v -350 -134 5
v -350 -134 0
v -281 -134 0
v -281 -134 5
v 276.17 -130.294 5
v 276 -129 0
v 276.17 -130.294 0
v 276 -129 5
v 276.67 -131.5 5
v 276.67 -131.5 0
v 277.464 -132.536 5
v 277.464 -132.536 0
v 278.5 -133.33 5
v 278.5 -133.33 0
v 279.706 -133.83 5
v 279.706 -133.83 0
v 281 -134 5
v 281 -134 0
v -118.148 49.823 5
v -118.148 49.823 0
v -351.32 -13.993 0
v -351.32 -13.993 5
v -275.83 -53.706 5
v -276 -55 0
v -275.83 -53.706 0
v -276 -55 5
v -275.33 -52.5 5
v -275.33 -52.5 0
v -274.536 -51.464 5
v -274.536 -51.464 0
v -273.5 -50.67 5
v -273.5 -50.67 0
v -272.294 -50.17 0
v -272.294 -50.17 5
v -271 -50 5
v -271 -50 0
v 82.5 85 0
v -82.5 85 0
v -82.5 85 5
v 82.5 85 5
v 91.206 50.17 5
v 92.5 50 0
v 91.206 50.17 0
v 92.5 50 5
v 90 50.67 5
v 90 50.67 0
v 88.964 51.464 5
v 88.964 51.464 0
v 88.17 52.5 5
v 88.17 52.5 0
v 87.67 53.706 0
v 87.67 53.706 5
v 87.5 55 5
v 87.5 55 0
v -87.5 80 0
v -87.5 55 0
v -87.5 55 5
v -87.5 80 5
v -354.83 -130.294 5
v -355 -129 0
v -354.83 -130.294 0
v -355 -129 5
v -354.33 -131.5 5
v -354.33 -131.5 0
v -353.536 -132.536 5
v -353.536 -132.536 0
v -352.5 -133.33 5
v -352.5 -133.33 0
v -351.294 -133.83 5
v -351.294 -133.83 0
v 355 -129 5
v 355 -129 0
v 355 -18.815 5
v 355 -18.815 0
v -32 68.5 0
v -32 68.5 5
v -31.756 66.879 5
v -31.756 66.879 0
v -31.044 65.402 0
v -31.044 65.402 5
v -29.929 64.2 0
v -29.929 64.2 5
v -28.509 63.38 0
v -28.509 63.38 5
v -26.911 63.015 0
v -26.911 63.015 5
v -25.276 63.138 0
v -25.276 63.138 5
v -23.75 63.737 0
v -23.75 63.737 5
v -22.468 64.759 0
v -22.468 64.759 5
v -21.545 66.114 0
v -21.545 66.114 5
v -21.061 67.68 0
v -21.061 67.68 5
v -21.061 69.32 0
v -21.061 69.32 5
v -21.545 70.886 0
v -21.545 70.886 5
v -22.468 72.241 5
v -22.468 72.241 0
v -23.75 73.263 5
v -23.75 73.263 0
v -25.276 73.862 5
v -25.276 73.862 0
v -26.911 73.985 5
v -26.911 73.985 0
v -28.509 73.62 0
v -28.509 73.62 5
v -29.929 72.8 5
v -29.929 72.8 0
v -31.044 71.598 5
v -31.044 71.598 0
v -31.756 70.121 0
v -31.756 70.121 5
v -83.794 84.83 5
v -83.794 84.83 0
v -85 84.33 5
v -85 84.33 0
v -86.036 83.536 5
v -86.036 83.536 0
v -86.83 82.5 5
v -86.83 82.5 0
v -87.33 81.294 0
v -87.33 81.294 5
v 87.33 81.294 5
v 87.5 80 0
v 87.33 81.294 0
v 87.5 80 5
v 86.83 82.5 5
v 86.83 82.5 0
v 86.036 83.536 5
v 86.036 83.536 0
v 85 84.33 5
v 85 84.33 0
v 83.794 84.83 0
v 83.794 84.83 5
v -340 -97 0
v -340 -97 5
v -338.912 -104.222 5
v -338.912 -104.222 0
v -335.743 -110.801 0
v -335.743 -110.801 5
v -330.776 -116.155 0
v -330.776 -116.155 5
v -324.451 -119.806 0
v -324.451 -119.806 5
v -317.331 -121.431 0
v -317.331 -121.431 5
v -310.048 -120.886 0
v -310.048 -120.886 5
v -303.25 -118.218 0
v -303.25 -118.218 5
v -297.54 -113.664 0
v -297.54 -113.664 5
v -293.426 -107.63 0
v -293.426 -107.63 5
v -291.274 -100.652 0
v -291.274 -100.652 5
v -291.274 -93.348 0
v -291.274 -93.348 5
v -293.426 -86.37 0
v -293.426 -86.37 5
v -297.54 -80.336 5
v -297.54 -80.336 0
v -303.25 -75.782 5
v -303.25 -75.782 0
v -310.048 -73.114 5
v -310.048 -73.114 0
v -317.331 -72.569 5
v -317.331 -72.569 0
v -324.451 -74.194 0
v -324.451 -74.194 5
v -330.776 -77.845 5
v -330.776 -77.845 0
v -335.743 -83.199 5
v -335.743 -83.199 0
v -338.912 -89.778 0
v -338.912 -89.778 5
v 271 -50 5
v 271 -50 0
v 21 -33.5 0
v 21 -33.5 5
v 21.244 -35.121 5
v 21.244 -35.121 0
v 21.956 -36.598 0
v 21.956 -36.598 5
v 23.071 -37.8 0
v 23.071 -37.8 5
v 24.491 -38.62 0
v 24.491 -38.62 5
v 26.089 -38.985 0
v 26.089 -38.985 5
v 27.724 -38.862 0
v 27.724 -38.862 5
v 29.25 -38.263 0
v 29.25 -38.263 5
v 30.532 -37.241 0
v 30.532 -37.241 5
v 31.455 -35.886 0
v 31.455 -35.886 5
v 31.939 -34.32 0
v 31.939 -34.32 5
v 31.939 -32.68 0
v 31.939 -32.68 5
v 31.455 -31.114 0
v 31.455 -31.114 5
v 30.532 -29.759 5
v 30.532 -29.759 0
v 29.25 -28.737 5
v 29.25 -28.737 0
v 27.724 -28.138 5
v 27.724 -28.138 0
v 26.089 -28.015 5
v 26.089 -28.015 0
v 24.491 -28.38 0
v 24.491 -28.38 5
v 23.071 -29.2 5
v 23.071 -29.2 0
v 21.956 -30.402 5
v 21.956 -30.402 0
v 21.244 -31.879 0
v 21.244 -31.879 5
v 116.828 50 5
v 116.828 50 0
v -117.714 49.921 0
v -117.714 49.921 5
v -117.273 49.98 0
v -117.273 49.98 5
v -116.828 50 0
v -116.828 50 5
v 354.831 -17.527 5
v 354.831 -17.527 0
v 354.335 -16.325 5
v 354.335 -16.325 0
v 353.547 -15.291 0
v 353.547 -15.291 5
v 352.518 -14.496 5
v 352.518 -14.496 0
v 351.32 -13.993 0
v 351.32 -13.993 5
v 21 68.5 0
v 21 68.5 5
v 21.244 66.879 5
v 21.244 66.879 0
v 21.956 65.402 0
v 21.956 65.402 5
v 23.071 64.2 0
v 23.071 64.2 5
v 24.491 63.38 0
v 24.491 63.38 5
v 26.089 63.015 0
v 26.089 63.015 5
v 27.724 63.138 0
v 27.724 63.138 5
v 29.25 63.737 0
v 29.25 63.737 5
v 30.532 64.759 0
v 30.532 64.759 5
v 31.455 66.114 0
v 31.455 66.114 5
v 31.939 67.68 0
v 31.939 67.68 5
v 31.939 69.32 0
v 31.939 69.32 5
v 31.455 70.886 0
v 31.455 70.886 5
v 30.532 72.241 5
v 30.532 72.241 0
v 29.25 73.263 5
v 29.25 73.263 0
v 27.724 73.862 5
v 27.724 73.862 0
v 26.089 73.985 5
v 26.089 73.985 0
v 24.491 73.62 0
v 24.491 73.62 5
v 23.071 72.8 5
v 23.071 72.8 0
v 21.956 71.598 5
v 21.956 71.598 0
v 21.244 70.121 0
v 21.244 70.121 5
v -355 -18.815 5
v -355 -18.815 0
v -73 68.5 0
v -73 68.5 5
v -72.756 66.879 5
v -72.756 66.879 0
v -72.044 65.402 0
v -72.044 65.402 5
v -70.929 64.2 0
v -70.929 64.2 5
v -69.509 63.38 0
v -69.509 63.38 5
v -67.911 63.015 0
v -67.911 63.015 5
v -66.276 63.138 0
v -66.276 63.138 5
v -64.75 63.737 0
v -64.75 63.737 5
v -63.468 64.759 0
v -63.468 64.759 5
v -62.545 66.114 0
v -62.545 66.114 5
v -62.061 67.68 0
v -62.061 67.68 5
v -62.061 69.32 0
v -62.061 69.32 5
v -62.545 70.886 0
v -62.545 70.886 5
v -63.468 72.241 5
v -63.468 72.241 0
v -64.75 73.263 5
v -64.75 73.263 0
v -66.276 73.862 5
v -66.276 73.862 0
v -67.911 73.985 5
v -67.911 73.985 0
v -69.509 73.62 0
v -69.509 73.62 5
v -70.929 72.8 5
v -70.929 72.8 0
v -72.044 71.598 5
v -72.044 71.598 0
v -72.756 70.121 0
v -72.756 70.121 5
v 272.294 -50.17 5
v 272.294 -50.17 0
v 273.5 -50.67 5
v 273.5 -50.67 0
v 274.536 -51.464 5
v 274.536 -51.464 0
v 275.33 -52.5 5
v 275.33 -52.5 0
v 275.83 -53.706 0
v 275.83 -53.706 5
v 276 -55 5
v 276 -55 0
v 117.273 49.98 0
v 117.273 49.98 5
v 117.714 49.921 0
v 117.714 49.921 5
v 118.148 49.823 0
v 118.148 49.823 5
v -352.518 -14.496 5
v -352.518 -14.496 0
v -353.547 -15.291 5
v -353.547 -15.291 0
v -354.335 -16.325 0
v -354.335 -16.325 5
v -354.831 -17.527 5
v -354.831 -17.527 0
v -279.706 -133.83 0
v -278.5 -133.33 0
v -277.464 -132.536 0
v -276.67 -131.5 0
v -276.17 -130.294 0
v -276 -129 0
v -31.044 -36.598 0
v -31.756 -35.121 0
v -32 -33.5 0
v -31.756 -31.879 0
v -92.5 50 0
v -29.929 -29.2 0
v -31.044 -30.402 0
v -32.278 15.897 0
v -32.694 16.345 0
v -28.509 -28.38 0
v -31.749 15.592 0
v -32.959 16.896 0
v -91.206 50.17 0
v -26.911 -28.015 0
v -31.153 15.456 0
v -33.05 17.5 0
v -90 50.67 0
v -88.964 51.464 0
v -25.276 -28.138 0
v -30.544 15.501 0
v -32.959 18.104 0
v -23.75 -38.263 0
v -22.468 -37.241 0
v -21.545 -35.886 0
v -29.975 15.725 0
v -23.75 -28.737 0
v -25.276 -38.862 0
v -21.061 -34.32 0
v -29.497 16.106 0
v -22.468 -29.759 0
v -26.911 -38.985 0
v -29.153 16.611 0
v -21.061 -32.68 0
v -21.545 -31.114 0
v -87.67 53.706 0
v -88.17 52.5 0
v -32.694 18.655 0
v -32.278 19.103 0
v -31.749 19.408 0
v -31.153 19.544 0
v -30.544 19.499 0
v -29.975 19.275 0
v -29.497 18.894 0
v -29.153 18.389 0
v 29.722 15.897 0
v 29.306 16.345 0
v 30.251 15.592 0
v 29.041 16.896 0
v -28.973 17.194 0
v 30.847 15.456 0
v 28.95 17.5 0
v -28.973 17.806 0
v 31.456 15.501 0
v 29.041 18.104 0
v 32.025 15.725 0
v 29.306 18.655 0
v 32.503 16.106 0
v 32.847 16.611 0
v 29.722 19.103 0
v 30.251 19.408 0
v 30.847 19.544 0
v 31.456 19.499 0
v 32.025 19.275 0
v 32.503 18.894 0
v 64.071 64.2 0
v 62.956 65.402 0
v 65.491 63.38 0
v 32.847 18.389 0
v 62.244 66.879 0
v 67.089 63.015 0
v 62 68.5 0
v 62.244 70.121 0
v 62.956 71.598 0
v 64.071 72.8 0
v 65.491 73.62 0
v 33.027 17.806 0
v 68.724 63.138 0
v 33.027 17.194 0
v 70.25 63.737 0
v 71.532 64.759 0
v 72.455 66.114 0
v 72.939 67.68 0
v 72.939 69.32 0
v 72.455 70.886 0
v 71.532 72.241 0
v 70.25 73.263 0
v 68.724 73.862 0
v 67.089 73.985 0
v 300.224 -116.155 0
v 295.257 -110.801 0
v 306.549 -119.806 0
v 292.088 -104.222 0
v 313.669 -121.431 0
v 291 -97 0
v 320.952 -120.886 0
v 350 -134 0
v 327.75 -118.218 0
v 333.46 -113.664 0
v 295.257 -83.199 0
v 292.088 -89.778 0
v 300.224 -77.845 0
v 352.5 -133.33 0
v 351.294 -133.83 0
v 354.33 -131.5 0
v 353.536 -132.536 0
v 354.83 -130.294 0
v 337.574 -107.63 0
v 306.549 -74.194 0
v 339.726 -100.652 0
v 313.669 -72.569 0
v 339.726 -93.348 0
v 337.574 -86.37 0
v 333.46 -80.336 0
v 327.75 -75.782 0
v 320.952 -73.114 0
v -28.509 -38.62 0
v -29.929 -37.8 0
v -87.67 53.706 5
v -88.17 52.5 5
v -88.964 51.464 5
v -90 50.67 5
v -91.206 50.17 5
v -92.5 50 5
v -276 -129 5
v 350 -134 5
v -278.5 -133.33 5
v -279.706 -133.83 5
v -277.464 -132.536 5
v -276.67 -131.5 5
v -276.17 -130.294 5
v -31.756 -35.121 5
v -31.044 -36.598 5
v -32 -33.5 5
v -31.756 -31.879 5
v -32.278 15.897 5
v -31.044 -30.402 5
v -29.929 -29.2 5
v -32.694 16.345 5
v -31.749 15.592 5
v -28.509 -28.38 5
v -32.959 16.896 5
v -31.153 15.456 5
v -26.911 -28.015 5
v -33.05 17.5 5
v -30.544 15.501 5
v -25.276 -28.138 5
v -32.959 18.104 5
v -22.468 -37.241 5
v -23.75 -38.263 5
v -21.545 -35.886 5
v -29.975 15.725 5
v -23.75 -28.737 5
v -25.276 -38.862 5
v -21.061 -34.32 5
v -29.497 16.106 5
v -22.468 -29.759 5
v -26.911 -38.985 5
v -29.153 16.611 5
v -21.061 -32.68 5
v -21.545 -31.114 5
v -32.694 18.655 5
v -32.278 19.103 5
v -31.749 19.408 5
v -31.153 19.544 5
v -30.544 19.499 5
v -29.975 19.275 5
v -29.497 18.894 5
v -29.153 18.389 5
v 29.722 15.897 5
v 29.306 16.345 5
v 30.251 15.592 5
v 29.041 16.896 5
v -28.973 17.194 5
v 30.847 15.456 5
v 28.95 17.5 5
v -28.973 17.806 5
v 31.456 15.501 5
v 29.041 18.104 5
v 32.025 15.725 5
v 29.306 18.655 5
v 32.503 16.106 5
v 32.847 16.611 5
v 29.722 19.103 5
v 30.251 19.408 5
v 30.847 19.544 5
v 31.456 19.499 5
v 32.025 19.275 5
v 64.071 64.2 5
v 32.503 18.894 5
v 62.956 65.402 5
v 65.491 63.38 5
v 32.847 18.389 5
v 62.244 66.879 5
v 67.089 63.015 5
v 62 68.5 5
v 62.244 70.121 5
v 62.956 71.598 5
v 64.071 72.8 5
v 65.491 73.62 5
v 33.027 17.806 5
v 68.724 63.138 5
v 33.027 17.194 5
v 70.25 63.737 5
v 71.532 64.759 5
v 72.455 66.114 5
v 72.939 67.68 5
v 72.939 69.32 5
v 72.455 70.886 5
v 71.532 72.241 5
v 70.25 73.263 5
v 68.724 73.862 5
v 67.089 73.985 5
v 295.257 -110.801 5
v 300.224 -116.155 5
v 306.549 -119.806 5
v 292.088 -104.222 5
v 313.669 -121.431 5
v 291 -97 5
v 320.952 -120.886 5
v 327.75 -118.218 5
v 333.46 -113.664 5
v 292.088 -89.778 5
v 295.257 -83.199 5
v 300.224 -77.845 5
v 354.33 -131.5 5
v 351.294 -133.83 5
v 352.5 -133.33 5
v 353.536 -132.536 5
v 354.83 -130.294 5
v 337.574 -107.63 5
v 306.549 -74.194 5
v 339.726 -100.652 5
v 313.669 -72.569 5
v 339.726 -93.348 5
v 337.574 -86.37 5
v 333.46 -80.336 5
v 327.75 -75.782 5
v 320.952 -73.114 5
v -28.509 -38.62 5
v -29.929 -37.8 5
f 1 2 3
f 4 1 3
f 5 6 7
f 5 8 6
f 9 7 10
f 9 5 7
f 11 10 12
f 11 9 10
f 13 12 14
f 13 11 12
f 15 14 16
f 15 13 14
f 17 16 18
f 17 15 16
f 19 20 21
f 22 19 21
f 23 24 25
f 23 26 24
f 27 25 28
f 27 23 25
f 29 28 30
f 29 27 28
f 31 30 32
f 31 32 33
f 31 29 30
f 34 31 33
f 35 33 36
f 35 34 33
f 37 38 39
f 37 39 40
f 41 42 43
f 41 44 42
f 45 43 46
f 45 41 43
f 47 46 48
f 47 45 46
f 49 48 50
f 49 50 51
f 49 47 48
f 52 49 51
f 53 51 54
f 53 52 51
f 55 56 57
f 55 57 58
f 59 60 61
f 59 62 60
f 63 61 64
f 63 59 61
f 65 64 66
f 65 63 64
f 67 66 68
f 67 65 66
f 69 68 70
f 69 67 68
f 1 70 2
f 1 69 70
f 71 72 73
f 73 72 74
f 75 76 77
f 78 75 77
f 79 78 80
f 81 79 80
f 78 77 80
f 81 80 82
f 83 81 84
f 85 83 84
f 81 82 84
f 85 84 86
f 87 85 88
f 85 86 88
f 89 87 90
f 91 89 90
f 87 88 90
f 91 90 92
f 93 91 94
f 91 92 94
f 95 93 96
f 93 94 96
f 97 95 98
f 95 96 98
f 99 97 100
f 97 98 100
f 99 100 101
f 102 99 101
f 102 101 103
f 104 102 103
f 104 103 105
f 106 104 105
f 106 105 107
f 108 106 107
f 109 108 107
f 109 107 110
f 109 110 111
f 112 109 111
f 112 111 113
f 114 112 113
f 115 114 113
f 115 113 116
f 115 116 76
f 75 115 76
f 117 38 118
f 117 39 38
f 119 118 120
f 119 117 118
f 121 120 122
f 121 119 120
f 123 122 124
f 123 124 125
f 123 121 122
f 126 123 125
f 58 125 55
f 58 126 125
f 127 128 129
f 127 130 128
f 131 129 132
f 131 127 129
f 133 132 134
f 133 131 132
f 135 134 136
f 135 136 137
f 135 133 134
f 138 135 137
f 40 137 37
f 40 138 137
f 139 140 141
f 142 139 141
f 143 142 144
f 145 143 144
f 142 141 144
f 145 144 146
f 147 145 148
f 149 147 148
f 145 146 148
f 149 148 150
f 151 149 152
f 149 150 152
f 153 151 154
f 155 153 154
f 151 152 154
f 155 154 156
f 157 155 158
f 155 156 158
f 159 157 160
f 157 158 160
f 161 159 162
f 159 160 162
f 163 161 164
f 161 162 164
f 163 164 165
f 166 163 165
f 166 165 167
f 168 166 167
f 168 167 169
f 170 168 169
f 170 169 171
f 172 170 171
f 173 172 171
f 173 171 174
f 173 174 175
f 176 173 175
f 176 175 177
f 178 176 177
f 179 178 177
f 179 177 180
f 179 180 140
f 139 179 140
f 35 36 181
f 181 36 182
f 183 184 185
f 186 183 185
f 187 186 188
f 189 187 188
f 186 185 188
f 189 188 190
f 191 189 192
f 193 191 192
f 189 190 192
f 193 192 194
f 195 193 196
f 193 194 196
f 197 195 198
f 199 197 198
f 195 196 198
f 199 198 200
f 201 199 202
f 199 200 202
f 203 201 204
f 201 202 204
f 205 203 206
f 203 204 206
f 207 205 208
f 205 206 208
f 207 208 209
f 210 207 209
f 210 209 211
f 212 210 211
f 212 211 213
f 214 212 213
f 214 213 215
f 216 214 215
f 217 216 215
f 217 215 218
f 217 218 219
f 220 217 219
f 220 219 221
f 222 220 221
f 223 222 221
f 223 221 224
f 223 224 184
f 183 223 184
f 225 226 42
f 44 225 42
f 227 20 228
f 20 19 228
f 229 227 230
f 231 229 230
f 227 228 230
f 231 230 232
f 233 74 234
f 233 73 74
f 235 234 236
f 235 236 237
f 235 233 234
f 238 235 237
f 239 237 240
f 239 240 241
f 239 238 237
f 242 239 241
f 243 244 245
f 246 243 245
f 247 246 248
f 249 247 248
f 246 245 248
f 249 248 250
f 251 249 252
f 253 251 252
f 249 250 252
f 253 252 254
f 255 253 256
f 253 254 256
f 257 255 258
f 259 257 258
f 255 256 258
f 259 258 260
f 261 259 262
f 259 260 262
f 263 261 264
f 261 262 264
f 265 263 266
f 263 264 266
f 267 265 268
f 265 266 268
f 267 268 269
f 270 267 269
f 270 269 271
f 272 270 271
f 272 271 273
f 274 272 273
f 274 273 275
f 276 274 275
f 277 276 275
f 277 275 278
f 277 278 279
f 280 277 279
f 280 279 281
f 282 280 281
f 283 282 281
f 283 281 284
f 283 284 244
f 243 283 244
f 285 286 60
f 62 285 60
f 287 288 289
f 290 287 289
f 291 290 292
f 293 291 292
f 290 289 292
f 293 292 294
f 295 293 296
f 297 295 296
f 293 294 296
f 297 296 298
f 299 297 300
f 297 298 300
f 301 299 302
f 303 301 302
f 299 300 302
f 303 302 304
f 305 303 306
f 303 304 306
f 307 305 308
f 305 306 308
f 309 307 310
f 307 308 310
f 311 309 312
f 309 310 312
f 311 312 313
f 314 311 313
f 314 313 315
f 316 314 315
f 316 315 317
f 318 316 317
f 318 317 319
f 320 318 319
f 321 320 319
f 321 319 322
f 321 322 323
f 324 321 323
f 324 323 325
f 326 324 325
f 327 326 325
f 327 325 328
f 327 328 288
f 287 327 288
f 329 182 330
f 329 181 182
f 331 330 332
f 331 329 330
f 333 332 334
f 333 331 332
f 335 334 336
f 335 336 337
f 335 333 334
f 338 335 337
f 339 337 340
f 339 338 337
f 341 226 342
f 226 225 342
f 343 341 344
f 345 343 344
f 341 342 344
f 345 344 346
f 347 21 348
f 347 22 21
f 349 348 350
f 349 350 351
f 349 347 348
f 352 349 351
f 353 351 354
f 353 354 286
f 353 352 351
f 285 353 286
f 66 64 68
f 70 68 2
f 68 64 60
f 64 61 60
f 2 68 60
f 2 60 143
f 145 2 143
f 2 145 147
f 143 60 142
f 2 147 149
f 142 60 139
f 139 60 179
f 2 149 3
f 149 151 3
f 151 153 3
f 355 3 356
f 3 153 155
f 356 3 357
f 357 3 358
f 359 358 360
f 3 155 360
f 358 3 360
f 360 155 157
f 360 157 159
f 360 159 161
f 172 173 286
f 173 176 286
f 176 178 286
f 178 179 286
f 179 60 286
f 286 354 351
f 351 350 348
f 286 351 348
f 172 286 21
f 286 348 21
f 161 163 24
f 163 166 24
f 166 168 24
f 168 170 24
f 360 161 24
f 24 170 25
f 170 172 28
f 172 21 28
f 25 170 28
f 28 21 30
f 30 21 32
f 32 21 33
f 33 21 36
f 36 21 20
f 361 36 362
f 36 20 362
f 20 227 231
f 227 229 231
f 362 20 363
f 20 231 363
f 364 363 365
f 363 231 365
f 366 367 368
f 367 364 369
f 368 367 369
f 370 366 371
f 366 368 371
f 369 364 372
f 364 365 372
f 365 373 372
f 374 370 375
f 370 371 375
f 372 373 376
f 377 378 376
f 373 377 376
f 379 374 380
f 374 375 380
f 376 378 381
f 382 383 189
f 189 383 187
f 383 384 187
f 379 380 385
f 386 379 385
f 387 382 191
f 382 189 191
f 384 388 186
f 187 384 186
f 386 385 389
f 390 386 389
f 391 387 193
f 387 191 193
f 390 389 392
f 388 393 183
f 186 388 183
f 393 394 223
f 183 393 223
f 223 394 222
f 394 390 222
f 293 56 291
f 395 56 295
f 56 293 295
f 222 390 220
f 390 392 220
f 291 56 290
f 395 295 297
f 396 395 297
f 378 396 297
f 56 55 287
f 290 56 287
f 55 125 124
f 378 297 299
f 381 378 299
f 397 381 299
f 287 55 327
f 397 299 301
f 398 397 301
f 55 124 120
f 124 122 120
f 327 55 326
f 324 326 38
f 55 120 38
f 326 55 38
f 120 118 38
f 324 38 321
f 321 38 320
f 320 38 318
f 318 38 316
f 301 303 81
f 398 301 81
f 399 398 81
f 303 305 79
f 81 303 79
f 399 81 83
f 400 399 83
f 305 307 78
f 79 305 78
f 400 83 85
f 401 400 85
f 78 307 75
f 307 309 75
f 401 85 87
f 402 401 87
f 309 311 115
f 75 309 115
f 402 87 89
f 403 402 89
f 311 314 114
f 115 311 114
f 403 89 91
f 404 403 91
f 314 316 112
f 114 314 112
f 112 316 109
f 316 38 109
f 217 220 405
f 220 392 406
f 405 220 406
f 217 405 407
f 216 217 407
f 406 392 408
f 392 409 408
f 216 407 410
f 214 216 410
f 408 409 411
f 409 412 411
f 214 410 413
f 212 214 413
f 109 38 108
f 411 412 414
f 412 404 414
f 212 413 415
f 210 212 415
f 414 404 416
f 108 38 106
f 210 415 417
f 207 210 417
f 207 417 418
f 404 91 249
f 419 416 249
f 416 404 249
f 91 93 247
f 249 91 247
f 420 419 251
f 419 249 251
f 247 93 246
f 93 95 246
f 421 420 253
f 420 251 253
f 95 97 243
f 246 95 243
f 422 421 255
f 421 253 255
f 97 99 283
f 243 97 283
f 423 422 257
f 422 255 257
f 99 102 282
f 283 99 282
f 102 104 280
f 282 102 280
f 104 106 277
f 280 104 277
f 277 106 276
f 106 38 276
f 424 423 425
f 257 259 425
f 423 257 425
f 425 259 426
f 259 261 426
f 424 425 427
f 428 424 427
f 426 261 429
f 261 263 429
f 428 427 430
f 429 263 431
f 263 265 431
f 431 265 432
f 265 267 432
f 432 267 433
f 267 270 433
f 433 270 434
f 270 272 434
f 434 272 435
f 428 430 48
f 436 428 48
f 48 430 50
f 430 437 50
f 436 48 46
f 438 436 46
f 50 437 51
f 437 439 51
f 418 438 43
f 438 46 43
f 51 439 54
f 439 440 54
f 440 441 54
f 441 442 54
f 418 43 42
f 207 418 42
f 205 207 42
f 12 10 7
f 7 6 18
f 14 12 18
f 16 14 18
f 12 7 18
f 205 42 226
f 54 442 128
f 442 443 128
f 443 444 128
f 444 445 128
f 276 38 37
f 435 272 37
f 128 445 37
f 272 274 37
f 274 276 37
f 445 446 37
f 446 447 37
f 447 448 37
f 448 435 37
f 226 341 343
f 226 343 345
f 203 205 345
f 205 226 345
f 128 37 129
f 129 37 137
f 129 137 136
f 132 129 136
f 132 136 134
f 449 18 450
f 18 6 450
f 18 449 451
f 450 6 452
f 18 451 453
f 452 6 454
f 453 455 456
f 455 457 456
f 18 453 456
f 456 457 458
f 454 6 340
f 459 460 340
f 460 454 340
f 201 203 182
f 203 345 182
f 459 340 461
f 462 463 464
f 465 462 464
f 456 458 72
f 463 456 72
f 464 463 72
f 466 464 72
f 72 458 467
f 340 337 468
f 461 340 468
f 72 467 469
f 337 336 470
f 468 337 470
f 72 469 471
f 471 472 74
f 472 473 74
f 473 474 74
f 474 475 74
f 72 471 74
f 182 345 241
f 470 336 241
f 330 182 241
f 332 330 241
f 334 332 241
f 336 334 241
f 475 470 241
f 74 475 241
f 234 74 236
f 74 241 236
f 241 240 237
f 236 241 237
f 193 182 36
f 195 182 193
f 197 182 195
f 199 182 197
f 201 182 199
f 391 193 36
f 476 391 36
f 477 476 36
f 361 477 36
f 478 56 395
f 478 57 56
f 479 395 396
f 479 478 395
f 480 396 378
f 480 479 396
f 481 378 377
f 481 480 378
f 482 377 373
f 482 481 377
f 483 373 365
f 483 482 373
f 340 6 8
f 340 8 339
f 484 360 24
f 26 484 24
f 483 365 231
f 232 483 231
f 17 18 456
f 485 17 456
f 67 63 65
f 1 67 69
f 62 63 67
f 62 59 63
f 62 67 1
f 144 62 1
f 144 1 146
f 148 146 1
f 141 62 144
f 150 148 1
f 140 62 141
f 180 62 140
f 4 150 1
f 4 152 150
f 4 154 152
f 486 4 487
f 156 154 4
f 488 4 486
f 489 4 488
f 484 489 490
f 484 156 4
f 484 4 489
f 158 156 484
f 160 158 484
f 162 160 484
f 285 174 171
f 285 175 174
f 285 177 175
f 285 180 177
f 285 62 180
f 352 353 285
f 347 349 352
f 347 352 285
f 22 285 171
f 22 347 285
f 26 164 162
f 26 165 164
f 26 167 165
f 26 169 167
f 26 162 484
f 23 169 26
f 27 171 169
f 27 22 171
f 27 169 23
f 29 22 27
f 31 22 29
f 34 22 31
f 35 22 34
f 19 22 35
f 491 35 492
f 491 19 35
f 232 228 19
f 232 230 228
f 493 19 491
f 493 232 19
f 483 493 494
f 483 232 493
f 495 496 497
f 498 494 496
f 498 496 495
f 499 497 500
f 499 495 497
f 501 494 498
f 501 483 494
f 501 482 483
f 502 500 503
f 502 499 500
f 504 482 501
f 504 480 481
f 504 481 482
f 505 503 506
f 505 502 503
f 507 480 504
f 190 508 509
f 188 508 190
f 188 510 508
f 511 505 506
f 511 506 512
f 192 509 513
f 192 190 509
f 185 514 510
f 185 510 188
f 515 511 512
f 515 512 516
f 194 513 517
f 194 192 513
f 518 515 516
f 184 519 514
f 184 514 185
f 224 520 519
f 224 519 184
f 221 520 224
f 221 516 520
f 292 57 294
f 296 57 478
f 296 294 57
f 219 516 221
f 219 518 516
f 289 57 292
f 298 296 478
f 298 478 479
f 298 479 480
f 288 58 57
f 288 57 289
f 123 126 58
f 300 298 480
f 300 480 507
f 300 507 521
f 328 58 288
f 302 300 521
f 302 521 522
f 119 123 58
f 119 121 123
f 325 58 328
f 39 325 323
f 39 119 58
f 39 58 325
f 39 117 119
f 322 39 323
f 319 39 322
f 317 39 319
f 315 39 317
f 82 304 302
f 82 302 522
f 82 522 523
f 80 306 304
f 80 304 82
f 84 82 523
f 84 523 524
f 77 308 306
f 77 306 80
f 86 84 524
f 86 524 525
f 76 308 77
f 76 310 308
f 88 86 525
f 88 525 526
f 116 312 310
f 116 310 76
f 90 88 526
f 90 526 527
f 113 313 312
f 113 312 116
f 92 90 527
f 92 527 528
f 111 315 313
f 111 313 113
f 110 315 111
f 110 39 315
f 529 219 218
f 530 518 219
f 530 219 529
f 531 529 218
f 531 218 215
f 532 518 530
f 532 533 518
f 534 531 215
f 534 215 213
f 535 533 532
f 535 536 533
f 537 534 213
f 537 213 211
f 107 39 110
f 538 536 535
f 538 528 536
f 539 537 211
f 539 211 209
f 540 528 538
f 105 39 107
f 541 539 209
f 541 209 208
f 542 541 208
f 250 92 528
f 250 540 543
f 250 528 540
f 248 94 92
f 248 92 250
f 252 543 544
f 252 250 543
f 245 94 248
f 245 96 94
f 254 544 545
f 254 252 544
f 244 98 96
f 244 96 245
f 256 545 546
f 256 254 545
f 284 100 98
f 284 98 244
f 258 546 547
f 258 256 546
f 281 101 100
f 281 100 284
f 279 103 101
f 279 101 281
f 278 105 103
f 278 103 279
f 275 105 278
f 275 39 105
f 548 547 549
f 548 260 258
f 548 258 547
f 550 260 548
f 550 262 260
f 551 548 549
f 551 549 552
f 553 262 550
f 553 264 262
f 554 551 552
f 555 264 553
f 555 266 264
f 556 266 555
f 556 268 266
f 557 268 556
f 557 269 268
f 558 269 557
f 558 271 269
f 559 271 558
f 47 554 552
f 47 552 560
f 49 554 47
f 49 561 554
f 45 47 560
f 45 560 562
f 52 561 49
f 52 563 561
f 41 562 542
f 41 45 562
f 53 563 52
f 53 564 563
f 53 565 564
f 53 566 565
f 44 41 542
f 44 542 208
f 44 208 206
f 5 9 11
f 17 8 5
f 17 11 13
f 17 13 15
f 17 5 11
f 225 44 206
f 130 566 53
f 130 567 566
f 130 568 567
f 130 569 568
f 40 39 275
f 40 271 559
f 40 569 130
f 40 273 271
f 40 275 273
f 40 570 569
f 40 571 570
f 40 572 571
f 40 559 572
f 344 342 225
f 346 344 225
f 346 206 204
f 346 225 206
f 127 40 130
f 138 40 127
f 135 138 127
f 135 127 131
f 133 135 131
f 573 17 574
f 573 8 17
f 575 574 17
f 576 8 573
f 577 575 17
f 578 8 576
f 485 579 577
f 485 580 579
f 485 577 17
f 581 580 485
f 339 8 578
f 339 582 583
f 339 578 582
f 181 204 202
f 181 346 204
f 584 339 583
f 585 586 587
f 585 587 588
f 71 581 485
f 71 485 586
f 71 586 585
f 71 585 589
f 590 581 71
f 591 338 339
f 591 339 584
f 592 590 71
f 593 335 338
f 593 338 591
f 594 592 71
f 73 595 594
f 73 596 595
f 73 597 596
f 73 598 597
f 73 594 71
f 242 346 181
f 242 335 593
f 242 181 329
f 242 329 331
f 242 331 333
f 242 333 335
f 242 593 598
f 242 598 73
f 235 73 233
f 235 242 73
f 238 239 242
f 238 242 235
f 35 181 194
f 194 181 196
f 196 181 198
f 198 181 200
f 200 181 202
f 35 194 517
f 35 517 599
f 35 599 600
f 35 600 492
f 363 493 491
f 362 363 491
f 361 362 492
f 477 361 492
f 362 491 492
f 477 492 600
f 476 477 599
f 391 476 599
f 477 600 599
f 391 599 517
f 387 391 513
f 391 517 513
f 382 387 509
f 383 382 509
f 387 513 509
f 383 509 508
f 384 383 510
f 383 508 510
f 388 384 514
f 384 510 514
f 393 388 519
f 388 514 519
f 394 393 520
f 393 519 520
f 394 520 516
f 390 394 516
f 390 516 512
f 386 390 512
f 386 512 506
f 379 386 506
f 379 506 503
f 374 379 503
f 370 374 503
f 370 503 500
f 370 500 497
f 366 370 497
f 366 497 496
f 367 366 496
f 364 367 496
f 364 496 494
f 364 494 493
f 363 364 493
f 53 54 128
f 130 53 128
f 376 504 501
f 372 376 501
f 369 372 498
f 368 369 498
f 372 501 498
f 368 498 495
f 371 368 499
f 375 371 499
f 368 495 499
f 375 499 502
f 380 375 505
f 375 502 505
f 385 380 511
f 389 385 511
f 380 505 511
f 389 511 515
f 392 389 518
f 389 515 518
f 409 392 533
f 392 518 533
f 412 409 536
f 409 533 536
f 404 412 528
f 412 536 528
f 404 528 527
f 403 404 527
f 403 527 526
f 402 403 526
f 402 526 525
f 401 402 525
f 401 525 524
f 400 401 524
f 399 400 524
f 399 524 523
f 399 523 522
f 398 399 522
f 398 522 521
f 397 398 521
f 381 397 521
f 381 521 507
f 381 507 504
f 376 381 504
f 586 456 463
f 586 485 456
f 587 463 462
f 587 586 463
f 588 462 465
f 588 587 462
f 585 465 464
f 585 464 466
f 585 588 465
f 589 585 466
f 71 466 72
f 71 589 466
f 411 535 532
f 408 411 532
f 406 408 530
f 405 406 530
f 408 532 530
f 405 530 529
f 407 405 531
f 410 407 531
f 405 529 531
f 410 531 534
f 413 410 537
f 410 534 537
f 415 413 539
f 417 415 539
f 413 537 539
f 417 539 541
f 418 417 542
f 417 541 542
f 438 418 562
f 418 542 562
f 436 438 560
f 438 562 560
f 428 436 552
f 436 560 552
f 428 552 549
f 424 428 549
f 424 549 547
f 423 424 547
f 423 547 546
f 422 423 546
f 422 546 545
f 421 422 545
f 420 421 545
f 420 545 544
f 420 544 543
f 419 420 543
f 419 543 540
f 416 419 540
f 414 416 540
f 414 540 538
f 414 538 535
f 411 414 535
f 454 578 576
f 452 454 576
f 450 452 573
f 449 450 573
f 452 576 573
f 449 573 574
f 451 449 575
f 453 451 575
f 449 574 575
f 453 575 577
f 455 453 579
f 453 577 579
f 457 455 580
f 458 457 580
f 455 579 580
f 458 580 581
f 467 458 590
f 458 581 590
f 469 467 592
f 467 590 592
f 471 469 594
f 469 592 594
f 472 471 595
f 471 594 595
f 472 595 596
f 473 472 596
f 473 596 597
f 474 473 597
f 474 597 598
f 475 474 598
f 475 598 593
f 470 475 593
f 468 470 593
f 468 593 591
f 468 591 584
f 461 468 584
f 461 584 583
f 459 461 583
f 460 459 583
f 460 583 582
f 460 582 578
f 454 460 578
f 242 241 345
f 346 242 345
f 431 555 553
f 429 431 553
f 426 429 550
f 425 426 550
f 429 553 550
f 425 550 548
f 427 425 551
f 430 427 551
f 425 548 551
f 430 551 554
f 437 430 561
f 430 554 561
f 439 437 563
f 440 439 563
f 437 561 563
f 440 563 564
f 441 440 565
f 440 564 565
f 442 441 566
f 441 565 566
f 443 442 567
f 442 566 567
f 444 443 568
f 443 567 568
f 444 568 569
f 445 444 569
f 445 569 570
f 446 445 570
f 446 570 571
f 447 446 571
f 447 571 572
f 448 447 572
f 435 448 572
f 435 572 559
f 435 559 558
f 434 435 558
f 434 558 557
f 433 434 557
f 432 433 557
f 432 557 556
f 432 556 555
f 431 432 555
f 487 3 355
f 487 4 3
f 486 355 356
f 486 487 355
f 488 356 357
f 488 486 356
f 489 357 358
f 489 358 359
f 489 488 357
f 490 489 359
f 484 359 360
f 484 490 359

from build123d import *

# Parameters (mm, degrees)
F0_W     = 79
F0_H     = 84
F0_W_2   = 175
F0_H_2   = 35
F1_DEPTH = 5
F2_R     = 5
F3_R     = 5
F6_D     = 4.1
F8_D     = 49
F9_D     = 11


# Not quite as in the source:
# - a feature names something its author has since deleted; it is built from what else it names


with BuildPart() as f1:
    # F0 (on Top) → F1 (new body)
    with BuildSketch(Plane.XY):
        Polygon((-87.5, 50), (-117.5, 50), (-355, -15), (-355, -50), (-276, -50), (276, -50), (355, -50), (355, -15), (117.5, 50), (87.5, 50), align=None)
        with Locations((-315.5, -92)):
            Rectangle(F0_W, F0_H)
        with Locations((315.5, -92)):
            Rectangle(F0_W, F0_H)
        with Locations((0, 67.5)):
            Rectangle(F0_W_2, F0_H_2)
    extrude(amount=F1_DEPTH)

    # F2
    f2_edges = [f1.edges().sort_by_distance(p)[0] for p in [
        (-355, -134, 2.5),
        (-276, -134, 2.5),
        (276, -134, 2.5),
        (355, -134, 2.5),
        (355, -15, 2.5),
        (-355, -15, 2.5),
        (-276, -50, 2.5),
        (276, -50, 2.5),
        (-87.5, 50, 2.5),
        (-87.5, 85, 2.5),
        (87.5, 85, 2.5),
        (87.5, 50, 2.5),
    ]]
    fillet(f2_edges, radius=F2_R)

    # F3
    f3_edges = [f1.edges().sort_by_distance(p)[0] for p in [
        (117.5, 50, 2.5),
        (-117.5, 50, 2.5),
    ]]
    fillet(f3_edges, radius=F3_R)

    # F6 (through all)
    with Locations(Plane(origin=(0, 0, 0), x_dir=(1, 0, 0), z_dir=(0, 0, -1))):
        with Locations((-31, -17.5), (31, -17.5)):
            Hole(F6_D / 2)

    # F8 (through all)
    with Locations(Plane(origin=(0, 0, 0), x_dir=(1, 0, 0), z_dir=(0, 0, -1))):
        with Locations((-315.5, 97), (315.5, 97)):
            Hole(F8_D / 2)

    # F9 (through all)
    with Locations(Plane(origin=(0, 0, 0), x_dir=(1, 0, 0), z_dir=(0, 0, -1))):
        with Locations((-67.5, -68.5), (67.5, -68.5), (-26.5, -68.5), (26.5, -68.5), (-26.5, 33.5), (26.5, 33.5)):
            Hole(F9_D / 2)


solid = f1.part
